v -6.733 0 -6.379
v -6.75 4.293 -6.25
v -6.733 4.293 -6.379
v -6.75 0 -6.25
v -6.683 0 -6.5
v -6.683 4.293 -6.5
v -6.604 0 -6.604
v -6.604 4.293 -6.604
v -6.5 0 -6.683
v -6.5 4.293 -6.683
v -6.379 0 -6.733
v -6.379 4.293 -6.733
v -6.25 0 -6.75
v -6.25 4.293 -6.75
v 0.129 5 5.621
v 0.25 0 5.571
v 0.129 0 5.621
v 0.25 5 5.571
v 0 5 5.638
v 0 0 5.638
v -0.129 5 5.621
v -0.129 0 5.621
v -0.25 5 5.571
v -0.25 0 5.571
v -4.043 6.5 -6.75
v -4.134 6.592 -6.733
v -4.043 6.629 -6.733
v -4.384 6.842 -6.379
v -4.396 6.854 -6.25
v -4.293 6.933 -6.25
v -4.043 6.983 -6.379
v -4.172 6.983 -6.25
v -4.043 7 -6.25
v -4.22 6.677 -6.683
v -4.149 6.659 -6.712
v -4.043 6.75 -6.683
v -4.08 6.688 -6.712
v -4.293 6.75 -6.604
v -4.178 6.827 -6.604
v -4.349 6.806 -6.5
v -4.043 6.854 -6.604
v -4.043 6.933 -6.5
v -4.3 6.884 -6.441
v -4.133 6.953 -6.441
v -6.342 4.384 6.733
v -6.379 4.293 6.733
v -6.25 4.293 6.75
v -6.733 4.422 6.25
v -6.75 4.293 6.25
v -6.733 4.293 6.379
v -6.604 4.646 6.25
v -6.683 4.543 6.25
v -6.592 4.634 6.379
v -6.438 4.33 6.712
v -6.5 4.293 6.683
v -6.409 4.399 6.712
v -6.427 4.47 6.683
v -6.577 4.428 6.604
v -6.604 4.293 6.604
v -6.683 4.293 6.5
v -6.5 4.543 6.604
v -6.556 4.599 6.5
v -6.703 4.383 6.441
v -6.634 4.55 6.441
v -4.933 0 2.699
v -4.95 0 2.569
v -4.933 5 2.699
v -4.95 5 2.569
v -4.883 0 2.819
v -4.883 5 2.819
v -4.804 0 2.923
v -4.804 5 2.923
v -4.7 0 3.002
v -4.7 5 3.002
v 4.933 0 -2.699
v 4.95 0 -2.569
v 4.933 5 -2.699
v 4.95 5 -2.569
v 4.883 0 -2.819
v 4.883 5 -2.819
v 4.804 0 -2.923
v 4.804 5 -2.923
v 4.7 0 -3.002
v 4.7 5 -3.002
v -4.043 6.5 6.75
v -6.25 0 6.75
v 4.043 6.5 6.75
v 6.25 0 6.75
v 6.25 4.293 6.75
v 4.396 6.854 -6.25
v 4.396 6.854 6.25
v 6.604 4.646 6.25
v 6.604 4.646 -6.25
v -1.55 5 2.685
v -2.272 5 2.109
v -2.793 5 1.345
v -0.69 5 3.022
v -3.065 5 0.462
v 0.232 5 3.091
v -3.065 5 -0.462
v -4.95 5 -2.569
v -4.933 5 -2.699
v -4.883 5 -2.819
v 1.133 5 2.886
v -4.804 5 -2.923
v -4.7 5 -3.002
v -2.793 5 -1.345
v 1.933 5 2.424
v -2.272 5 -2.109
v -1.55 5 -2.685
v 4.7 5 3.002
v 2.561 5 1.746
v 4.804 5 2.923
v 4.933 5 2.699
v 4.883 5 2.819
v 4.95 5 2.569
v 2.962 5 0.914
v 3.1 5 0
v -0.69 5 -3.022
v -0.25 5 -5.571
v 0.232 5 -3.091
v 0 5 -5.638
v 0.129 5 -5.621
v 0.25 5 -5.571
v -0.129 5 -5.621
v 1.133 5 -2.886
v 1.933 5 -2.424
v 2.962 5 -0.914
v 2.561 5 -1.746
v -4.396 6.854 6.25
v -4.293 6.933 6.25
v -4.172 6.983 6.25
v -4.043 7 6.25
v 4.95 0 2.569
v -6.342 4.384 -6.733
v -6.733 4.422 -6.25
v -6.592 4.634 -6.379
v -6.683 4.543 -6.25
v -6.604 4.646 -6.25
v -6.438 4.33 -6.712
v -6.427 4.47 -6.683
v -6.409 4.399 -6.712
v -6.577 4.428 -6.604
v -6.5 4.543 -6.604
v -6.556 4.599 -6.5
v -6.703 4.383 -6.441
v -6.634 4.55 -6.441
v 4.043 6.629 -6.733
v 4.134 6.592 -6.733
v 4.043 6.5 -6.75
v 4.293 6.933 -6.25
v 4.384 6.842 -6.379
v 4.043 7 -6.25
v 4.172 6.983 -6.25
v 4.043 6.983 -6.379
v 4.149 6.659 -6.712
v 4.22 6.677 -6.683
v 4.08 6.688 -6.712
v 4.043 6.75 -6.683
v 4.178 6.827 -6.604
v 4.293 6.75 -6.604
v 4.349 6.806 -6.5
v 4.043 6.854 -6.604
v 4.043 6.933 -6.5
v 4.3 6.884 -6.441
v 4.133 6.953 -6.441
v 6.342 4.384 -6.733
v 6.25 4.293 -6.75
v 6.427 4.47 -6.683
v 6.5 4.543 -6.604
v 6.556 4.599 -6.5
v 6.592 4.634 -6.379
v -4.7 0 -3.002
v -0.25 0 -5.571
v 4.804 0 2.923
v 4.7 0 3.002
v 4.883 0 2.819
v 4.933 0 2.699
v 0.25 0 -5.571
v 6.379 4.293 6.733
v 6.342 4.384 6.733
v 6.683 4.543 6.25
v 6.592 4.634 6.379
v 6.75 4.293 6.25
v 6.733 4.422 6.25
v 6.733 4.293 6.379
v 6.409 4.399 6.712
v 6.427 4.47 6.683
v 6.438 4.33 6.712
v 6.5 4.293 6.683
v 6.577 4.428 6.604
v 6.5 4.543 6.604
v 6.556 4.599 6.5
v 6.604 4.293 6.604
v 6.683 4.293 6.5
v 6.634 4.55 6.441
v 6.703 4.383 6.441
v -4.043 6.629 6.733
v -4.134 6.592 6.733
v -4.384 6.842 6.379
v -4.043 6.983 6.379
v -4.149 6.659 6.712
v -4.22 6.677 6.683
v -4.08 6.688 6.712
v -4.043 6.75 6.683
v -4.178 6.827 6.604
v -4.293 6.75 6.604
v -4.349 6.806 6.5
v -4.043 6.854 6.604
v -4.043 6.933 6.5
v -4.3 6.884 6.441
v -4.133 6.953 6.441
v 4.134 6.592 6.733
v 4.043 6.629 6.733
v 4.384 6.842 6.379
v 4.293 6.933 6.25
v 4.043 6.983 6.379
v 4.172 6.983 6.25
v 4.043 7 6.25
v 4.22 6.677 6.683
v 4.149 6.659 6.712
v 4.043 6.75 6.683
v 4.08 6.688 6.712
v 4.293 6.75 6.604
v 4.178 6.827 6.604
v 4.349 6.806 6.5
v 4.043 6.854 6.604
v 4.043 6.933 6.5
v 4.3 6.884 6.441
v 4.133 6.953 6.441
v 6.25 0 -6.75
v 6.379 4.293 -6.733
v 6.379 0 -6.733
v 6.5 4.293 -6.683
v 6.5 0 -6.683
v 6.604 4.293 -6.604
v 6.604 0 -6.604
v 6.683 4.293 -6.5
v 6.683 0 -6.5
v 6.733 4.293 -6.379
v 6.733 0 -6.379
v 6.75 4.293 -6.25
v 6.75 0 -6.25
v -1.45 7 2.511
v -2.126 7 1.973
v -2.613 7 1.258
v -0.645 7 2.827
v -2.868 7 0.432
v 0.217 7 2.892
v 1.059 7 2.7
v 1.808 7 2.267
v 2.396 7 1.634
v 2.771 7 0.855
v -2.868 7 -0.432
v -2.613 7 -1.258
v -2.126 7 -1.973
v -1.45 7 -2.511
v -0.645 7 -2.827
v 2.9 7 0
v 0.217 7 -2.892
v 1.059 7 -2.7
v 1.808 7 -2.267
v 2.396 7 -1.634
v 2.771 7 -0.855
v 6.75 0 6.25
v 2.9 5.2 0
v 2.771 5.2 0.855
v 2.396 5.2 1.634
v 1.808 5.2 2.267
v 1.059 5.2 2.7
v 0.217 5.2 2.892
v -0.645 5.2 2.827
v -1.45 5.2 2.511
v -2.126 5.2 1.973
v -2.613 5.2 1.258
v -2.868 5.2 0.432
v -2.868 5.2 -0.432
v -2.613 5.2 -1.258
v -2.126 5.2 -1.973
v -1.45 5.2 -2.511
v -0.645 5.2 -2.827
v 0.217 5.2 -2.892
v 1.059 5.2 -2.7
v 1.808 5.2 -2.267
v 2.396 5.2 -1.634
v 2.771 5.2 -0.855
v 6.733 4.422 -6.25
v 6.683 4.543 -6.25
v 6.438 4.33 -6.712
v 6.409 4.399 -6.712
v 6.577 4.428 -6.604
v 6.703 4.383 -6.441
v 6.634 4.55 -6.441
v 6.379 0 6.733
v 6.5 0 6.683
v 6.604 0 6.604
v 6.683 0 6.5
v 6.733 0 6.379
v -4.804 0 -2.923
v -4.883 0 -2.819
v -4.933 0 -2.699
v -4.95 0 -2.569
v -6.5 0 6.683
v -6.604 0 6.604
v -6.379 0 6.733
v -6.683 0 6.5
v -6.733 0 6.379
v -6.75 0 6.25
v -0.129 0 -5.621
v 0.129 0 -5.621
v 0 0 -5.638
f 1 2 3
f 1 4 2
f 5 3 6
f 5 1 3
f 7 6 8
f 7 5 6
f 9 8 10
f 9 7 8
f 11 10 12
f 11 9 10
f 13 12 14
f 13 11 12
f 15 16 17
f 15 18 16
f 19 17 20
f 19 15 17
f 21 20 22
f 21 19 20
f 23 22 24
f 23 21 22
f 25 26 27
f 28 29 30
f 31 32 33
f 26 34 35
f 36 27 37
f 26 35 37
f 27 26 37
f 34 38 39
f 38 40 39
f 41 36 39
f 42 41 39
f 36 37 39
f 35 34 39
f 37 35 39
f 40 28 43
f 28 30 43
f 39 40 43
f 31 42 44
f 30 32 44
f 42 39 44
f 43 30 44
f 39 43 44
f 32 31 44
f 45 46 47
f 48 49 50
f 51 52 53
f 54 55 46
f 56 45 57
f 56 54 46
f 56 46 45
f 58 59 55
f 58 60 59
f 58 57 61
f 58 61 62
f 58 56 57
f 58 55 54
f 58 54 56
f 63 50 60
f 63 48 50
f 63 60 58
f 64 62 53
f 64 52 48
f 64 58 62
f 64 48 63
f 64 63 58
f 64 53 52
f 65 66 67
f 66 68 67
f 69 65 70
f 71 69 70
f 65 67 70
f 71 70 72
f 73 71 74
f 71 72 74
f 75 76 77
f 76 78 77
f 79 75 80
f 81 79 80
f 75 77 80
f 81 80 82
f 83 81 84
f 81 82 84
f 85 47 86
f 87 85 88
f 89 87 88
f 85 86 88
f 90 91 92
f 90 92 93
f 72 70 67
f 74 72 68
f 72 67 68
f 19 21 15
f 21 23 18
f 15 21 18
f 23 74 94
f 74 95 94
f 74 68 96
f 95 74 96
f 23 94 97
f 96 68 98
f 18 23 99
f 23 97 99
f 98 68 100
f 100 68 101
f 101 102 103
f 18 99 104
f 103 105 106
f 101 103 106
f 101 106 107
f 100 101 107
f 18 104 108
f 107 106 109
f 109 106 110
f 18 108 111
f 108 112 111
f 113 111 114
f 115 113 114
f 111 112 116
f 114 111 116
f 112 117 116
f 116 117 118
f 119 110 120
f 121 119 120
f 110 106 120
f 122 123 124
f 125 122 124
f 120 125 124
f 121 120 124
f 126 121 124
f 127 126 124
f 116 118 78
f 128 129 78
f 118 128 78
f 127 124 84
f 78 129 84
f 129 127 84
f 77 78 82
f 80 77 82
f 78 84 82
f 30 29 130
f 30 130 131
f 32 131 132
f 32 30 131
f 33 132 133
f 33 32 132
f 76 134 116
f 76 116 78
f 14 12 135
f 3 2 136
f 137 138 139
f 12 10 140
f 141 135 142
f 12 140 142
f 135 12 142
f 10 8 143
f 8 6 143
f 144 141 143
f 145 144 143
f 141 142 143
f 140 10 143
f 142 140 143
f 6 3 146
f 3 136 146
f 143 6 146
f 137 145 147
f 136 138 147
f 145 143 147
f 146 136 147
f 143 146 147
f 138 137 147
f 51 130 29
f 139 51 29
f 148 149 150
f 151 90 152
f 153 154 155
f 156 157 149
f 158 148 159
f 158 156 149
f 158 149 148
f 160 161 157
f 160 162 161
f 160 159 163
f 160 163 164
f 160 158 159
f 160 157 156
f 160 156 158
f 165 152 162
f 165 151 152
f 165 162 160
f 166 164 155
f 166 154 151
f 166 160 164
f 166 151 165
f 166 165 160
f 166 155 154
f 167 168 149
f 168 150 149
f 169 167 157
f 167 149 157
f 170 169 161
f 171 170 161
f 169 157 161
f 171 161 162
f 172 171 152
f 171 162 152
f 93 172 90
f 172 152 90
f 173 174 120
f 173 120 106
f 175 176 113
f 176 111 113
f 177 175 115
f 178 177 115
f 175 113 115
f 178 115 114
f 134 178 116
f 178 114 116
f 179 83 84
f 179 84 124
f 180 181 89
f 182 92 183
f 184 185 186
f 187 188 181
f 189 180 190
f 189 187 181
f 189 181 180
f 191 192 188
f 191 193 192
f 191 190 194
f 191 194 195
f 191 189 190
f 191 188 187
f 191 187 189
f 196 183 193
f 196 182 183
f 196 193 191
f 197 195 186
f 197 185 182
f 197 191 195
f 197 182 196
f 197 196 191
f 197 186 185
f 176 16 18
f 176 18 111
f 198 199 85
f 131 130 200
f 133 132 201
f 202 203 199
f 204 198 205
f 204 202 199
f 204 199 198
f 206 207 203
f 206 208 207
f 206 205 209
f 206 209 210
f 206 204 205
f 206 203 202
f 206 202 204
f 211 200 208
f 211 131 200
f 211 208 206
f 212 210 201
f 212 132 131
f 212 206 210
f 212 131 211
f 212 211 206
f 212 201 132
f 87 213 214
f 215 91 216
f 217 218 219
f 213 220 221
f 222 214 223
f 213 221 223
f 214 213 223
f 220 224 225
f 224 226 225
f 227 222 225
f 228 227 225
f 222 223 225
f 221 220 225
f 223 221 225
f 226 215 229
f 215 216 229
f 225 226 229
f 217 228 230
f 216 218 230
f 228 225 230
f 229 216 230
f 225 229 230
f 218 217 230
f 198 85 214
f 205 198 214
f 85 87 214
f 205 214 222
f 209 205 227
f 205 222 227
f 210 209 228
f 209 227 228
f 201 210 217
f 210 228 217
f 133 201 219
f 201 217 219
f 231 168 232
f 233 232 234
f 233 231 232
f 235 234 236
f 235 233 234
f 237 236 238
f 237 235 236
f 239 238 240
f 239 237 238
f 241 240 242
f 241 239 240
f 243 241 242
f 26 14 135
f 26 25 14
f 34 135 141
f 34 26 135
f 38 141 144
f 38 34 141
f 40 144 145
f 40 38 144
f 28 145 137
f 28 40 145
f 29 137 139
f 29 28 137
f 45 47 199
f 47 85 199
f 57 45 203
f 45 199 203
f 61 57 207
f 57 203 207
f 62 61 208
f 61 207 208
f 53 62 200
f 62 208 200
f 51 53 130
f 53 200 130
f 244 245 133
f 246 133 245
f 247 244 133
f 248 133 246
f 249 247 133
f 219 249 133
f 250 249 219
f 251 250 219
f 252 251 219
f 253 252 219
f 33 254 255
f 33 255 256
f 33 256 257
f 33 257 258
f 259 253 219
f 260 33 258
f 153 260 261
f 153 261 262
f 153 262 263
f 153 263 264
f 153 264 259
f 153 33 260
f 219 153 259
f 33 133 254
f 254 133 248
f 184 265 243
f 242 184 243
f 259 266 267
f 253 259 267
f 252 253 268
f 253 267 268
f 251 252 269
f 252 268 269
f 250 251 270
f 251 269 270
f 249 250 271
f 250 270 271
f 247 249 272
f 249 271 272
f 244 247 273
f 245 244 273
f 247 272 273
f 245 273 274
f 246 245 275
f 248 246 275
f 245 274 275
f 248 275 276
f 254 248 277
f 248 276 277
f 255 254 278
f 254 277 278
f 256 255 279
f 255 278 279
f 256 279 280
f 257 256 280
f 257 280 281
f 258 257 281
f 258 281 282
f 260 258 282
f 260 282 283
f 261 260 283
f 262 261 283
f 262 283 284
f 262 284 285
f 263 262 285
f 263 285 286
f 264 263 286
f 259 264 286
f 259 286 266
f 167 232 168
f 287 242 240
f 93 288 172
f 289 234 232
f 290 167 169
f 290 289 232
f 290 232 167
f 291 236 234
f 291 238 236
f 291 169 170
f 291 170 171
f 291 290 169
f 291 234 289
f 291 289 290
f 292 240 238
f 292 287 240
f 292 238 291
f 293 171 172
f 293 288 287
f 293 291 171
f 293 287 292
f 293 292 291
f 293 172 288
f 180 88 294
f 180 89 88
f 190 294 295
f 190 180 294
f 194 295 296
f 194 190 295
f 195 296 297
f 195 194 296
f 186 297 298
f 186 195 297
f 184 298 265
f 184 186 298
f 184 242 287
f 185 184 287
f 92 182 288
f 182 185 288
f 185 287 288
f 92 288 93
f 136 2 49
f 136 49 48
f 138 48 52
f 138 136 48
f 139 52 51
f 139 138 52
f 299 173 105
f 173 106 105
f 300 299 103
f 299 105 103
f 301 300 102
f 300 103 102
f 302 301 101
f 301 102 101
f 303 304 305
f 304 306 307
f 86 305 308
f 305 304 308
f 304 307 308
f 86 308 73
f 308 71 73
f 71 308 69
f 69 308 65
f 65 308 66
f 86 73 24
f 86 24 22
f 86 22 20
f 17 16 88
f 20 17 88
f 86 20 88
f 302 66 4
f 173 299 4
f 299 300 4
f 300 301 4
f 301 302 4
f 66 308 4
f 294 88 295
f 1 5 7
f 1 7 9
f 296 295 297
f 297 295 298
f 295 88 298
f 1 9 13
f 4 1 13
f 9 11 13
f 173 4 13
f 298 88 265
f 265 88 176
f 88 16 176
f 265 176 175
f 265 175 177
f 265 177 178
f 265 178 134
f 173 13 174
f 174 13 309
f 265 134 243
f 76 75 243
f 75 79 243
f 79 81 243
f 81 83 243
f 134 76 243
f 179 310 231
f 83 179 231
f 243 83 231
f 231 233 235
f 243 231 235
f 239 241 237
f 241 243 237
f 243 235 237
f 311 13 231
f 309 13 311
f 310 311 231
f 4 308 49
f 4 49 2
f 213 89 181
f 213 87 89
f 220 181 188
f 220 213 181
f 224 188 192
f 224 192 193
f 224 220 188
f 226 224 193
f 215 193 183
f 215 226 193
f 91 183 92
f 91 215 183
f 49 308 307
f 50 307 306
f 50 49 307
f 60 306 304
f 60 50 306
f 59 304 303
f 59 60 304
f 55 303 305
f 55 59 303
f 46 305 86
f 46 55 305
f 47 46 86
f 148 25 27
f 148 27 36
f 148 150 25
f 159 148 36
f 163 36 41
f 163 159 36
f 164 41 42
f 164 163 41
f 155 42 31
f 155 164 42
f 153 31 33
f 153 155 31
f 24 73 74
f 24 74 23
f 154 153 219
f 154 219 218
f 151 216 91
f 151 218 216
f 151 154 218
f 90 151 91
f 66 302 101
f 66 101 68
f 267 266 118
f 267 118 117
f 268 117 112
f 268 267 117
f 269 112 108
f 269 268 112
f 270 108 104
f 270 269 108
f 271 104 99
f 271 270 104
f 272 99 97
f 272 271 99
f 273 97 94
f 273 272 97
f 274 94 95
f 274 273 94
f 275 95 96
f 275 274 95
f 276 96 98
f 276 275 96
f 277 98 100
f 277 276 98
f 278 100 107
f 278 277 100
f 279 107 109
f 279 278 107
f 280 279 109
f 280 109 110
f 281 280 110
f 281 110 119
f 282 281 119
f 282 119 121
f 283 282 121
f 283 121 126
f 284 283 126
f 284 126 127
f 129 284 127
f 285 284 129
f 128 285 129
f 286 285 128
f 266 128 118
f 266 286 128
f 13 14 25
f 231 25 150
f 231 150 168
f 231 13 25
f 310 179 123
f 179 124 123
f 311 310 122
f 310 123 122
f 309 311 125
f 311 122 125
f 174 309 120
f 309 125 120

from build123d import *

# Parameters (mm, degrees)
SKETCH1_W           = 13.5
SKETCH1_H           = 13.5
BOSS_EXTRUDE1_DEPTH = 5
SKETCH3_W           = 13.5
SKETCH3_H           = 13.5
BOSS_EXTRUDE2_DEPTH = 2
CHAMFER1_SIZE       = 2.5
FILLET2_R           = 0.5
FILLET1_R           = 0.5
CUT_EXTRUDE1_REACH  = 4
SKETCH4_R           = 2.9
CHAMFER2_SIZE       = 0.2


with BuildPart() as part:
    # Sketch1 → Boss-Extrude1 (new body)
    with BuildSketch(Plane(origin=(0, 0, 0), x_dir=(1, 0, 0), z_dir=(0, 1, 0))):
        Rectangle(SKETCH1_W, SKETCH1_H)
        Polygon((0, -5.715767665), (4.95, -2.857883832), (4.95, 2.857883832), (0, 5.715767665), (-4.95, 2.857883832), (-4.95, -2.857883832), align=None, mode=Mode.SUBTRACT)
    extrude(amount=BOSS_EXTRUDE1_DEPTH)

    # Sketch3 → Boss-Extrude2 (add)
    with BuildSketch(Plane(origin=(0, 5, 0), x_dir=(1, 0, 0), z_dir=(0, 1, 0))):
        Rectangle(SKETCH3_W, SKETCH3_H)
    extrude(amount=BOSS_EXTRUDE2_DEPTH)

    # Chamfer1
    chamfer1_edges = [part.edges().sort_by_distance(p)[0] for p in [
        (-6.75, 7, 0),
        (6.75, 7, 0),
    ]]
    chamfer(chamfer1_edges, length=CHAMFER1_SIZE)

    # Fillet2
    fillet2_edges = [part.edges().sort_by_distance(p)[0] for p in [
        (-4.95, 2.5, 2.857883832),
        (0, 2.5, 5.715767665),
        (4.95, 2.5, 2.857883832),
        (4.95, 2.5, -2.857883832),
        (0, 2.5, -5.715767665),
        (-4.95, 2.5, -2.857883832),
    ]]
    fillet(fillet2_edges, radius=FILLET2_R)

    # Fillet1
    fillet1_edges = [part.edges().sort_by_distance(p)[0] for p in [
        (0, 7, 6.75),
        (0, 7, -6.75),
        (-4.25, 7, 0),
        (4.25, 7, 0),
        (-6.75, 2.25, -6.75),
        (6.75, 2.25, -6.75),
        (-5.5, 5.75, -6.75),
        (5.5, 5.75, -6.75),
        (6.75, 2.25, 6.75),
        (6.75, 4.5, 0),
        (-6.75, 2.25, 6.75),
        (-5.5, 5.75, 6.75),
        (5.5, 5.75, 6.75),
        (-6.75, 4.5, 0),
    ]]
    fillet(fillet1_edges, radius=FILLET1_R)

    # Sketch4 → Cut-Extrude1 (cut, up to next)
    with BuildSketch(Plane.XZ.offset(-5), mode=Mode.PRIVATE) as cut_extrude1_sk1:
        Circle(SKETCH4_R)
    cut_extrude1_tool1 = extrude(cut_extrude1_sk1.sketch, amount=-CUT_EXTRUDE1_REACH, mode=Mode.PRIVATE) & part.part
    add(cut_extrude1_tool1.solids().sort_by_distance((0, 5, 0))[0], mode=Mode.SUBTRACT)

    # Chamfer2
    chamfer2_edges = [part.edges().sort_by_distance(p)[0] for p in [
        (-2.9, 5, 0),
    ]]
    chamfer(chamfer2_edges, length=CHAMFER2_SIZE)


solid = part.part
